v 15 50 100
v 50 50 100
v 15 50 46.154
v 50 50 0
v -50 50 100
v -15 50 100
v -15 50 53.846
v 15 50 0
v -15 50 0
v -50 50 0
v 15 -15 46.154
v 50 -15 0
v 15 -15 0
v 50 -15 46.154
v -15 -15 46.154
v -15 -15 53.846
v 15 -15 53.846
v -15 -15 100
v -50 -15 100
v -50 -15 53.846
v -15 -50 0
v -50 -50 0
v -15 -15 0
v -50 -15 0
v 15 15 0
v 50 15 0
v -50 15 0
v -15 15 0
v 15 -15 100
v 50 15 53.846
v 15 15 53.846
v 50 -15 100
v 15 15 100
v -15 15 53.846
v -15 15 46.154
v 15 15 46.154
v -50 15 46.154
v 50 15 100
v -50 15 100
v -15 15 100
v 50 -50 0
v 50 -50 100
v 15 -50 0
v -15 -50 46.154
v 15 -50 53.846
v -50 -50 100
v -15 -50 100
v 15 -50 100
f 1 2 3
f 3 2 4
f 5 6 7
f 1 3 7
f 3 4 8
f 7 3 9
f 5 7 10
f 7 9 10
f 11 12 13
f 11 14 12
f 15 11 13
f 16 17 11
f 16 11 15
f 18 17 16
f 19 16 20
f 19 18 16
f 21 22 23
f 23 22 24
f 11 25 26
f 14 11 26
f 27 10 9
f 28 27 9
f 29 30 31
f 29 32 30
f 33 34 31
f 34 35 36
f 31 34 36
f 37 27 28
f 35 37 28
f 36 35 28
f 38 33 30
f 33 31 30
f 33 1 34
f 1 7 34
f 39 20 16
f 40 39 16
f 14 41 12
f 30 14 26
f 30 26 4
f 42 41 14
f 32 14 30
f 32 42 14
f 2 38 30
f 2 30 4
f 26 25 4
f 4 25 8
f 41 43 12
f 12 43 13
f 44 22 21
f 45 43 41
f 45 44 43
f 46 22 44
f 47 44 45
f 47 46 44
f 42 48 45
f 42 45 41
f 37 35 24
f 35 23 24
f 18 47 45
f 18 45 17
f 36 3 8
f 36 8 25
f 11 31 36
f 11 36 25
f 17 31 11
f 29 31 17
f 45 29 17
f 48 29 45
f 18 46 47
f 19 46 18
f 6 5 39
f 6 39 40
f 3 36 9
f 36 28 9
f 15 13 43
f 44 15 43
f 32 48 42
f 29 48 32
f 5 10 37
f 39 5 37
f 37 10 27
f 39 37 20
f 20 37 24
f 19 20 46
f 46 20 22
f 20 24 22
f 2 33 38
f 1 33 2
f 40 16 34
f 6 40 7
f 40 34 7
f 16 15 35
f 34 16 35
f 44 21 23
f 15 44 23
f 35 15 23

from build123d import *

# Parameters (mm, degrees)
F2_W = 35
F2_H = 35
F0_W = 35
F0_H = 35


with BuildPart() as f3:
    # F2 (on offset) → F3 section 0
    with BuildSketch(Plane.XY.offset(100)):
        with Locations((-32.5, -32.5)):
            Rectangle(F2_W, F2_H)
    # F0 (on Top) → F3 section 1
    with BuildSketch(Plane.XY):
        with Locations((-32.5, -32.5)):
            Rectangle(F0_W, F0_H)
    loft()

    # F0 (on Top) → F4 section 0
    with BuildSketch(Plane.XY):
        with Locations((32.5, -32.5)):
            Rectangle(F0_W, F0_H)
    # F2 (on offset) → F4 section 1
    with BuildSketch(Plane.XY.offset(100)):
        with Locations((-32.5, -32.5)):
            Rectangle(F2_W, F2_H)
    loft()

    # F0 (on Top) → F5 section 0
    with BuildSketch(Plane.XY):
        with Locations((32.5, -32.5)):
            Rectangle(F0_W, F0_H)
    # F2 (on offset) → F5 section 1
    with BuildSketch(Plane.XY.offset(100)):
        with Locations((32.5, -32.5)):
            Rectangle(F2_W, F2_H)
    loft()



with BuildPart() as f6:
    # F0 (on Top) → F6 section 0
    with BuildSketch(Plane.XY):
        with Locations((32.5, 32.5)):
            Rectangle(F0_W, F0_H)
    # F2 (on offset) → F6 section 1
    with BuildSketch(Plane.XY.offset(100)):
        with Locations((32.5, 32.5)):
            Rectangle(F2_W, F2_H)
    loft()


with BuildPart() as f3_1:
    add(f3.part)

    add(f6.part)  # F7 merges F6
    # F0 (on Top) → F7 section 0
    with BuildSketch(Plane.XY):
        with Locations((32.5, 32.5)):
            Rectangle(F0_W, F0_H)
    # F2 (on offset) → F7 section 1
    with BuildSketch(Plane.XY.offset(100)):
        with Locations((32.5, -32.5)):
            Rectangle(F2_W, F2_H)
    loft()

    # F2 (on offset) → F8 section 0
    with BuildSketch(Plane.XY.offset(100)):
        with Locations((32.5, 32.5)):
            Rectangle(F2_W, F2_H)
    # F0 (on Top) → F8 section 1
    with BuildSketch(Plane.XY):
        with Locations((-32.5, 32.5)):
            Rectangle(F0_W, F0_H)
    loft()

    # F2 (on offset) → F9 section 0
    with BuildSketch(Plane.XY.offset(100)):
        with Locations((-32.5, 32.5)):
            Rectangle(F2_W, F2_H)
    # F0 (on Top) → F9 section 1
    with BuildSketch(Plane.XY):
        with Locations((-32.5, 32.5)):
            Rectangle(F0_W, F0_H)
    loft()

    # F2 (on offset) → F10 section 0
    with BuildSketch(Plane.XY.offset(100)):
        with Locations((-32.5, 32.5)):
            Rectangle(F2_W, F2_H)
    # F0 (on Top) → F10 section 1
    with BuildSketch(Plane.XY):
        with Locations((-32.5, -32.5)):
            Rectangle(F0_W, F0_H)
    loft()


solid = f3_1.part
